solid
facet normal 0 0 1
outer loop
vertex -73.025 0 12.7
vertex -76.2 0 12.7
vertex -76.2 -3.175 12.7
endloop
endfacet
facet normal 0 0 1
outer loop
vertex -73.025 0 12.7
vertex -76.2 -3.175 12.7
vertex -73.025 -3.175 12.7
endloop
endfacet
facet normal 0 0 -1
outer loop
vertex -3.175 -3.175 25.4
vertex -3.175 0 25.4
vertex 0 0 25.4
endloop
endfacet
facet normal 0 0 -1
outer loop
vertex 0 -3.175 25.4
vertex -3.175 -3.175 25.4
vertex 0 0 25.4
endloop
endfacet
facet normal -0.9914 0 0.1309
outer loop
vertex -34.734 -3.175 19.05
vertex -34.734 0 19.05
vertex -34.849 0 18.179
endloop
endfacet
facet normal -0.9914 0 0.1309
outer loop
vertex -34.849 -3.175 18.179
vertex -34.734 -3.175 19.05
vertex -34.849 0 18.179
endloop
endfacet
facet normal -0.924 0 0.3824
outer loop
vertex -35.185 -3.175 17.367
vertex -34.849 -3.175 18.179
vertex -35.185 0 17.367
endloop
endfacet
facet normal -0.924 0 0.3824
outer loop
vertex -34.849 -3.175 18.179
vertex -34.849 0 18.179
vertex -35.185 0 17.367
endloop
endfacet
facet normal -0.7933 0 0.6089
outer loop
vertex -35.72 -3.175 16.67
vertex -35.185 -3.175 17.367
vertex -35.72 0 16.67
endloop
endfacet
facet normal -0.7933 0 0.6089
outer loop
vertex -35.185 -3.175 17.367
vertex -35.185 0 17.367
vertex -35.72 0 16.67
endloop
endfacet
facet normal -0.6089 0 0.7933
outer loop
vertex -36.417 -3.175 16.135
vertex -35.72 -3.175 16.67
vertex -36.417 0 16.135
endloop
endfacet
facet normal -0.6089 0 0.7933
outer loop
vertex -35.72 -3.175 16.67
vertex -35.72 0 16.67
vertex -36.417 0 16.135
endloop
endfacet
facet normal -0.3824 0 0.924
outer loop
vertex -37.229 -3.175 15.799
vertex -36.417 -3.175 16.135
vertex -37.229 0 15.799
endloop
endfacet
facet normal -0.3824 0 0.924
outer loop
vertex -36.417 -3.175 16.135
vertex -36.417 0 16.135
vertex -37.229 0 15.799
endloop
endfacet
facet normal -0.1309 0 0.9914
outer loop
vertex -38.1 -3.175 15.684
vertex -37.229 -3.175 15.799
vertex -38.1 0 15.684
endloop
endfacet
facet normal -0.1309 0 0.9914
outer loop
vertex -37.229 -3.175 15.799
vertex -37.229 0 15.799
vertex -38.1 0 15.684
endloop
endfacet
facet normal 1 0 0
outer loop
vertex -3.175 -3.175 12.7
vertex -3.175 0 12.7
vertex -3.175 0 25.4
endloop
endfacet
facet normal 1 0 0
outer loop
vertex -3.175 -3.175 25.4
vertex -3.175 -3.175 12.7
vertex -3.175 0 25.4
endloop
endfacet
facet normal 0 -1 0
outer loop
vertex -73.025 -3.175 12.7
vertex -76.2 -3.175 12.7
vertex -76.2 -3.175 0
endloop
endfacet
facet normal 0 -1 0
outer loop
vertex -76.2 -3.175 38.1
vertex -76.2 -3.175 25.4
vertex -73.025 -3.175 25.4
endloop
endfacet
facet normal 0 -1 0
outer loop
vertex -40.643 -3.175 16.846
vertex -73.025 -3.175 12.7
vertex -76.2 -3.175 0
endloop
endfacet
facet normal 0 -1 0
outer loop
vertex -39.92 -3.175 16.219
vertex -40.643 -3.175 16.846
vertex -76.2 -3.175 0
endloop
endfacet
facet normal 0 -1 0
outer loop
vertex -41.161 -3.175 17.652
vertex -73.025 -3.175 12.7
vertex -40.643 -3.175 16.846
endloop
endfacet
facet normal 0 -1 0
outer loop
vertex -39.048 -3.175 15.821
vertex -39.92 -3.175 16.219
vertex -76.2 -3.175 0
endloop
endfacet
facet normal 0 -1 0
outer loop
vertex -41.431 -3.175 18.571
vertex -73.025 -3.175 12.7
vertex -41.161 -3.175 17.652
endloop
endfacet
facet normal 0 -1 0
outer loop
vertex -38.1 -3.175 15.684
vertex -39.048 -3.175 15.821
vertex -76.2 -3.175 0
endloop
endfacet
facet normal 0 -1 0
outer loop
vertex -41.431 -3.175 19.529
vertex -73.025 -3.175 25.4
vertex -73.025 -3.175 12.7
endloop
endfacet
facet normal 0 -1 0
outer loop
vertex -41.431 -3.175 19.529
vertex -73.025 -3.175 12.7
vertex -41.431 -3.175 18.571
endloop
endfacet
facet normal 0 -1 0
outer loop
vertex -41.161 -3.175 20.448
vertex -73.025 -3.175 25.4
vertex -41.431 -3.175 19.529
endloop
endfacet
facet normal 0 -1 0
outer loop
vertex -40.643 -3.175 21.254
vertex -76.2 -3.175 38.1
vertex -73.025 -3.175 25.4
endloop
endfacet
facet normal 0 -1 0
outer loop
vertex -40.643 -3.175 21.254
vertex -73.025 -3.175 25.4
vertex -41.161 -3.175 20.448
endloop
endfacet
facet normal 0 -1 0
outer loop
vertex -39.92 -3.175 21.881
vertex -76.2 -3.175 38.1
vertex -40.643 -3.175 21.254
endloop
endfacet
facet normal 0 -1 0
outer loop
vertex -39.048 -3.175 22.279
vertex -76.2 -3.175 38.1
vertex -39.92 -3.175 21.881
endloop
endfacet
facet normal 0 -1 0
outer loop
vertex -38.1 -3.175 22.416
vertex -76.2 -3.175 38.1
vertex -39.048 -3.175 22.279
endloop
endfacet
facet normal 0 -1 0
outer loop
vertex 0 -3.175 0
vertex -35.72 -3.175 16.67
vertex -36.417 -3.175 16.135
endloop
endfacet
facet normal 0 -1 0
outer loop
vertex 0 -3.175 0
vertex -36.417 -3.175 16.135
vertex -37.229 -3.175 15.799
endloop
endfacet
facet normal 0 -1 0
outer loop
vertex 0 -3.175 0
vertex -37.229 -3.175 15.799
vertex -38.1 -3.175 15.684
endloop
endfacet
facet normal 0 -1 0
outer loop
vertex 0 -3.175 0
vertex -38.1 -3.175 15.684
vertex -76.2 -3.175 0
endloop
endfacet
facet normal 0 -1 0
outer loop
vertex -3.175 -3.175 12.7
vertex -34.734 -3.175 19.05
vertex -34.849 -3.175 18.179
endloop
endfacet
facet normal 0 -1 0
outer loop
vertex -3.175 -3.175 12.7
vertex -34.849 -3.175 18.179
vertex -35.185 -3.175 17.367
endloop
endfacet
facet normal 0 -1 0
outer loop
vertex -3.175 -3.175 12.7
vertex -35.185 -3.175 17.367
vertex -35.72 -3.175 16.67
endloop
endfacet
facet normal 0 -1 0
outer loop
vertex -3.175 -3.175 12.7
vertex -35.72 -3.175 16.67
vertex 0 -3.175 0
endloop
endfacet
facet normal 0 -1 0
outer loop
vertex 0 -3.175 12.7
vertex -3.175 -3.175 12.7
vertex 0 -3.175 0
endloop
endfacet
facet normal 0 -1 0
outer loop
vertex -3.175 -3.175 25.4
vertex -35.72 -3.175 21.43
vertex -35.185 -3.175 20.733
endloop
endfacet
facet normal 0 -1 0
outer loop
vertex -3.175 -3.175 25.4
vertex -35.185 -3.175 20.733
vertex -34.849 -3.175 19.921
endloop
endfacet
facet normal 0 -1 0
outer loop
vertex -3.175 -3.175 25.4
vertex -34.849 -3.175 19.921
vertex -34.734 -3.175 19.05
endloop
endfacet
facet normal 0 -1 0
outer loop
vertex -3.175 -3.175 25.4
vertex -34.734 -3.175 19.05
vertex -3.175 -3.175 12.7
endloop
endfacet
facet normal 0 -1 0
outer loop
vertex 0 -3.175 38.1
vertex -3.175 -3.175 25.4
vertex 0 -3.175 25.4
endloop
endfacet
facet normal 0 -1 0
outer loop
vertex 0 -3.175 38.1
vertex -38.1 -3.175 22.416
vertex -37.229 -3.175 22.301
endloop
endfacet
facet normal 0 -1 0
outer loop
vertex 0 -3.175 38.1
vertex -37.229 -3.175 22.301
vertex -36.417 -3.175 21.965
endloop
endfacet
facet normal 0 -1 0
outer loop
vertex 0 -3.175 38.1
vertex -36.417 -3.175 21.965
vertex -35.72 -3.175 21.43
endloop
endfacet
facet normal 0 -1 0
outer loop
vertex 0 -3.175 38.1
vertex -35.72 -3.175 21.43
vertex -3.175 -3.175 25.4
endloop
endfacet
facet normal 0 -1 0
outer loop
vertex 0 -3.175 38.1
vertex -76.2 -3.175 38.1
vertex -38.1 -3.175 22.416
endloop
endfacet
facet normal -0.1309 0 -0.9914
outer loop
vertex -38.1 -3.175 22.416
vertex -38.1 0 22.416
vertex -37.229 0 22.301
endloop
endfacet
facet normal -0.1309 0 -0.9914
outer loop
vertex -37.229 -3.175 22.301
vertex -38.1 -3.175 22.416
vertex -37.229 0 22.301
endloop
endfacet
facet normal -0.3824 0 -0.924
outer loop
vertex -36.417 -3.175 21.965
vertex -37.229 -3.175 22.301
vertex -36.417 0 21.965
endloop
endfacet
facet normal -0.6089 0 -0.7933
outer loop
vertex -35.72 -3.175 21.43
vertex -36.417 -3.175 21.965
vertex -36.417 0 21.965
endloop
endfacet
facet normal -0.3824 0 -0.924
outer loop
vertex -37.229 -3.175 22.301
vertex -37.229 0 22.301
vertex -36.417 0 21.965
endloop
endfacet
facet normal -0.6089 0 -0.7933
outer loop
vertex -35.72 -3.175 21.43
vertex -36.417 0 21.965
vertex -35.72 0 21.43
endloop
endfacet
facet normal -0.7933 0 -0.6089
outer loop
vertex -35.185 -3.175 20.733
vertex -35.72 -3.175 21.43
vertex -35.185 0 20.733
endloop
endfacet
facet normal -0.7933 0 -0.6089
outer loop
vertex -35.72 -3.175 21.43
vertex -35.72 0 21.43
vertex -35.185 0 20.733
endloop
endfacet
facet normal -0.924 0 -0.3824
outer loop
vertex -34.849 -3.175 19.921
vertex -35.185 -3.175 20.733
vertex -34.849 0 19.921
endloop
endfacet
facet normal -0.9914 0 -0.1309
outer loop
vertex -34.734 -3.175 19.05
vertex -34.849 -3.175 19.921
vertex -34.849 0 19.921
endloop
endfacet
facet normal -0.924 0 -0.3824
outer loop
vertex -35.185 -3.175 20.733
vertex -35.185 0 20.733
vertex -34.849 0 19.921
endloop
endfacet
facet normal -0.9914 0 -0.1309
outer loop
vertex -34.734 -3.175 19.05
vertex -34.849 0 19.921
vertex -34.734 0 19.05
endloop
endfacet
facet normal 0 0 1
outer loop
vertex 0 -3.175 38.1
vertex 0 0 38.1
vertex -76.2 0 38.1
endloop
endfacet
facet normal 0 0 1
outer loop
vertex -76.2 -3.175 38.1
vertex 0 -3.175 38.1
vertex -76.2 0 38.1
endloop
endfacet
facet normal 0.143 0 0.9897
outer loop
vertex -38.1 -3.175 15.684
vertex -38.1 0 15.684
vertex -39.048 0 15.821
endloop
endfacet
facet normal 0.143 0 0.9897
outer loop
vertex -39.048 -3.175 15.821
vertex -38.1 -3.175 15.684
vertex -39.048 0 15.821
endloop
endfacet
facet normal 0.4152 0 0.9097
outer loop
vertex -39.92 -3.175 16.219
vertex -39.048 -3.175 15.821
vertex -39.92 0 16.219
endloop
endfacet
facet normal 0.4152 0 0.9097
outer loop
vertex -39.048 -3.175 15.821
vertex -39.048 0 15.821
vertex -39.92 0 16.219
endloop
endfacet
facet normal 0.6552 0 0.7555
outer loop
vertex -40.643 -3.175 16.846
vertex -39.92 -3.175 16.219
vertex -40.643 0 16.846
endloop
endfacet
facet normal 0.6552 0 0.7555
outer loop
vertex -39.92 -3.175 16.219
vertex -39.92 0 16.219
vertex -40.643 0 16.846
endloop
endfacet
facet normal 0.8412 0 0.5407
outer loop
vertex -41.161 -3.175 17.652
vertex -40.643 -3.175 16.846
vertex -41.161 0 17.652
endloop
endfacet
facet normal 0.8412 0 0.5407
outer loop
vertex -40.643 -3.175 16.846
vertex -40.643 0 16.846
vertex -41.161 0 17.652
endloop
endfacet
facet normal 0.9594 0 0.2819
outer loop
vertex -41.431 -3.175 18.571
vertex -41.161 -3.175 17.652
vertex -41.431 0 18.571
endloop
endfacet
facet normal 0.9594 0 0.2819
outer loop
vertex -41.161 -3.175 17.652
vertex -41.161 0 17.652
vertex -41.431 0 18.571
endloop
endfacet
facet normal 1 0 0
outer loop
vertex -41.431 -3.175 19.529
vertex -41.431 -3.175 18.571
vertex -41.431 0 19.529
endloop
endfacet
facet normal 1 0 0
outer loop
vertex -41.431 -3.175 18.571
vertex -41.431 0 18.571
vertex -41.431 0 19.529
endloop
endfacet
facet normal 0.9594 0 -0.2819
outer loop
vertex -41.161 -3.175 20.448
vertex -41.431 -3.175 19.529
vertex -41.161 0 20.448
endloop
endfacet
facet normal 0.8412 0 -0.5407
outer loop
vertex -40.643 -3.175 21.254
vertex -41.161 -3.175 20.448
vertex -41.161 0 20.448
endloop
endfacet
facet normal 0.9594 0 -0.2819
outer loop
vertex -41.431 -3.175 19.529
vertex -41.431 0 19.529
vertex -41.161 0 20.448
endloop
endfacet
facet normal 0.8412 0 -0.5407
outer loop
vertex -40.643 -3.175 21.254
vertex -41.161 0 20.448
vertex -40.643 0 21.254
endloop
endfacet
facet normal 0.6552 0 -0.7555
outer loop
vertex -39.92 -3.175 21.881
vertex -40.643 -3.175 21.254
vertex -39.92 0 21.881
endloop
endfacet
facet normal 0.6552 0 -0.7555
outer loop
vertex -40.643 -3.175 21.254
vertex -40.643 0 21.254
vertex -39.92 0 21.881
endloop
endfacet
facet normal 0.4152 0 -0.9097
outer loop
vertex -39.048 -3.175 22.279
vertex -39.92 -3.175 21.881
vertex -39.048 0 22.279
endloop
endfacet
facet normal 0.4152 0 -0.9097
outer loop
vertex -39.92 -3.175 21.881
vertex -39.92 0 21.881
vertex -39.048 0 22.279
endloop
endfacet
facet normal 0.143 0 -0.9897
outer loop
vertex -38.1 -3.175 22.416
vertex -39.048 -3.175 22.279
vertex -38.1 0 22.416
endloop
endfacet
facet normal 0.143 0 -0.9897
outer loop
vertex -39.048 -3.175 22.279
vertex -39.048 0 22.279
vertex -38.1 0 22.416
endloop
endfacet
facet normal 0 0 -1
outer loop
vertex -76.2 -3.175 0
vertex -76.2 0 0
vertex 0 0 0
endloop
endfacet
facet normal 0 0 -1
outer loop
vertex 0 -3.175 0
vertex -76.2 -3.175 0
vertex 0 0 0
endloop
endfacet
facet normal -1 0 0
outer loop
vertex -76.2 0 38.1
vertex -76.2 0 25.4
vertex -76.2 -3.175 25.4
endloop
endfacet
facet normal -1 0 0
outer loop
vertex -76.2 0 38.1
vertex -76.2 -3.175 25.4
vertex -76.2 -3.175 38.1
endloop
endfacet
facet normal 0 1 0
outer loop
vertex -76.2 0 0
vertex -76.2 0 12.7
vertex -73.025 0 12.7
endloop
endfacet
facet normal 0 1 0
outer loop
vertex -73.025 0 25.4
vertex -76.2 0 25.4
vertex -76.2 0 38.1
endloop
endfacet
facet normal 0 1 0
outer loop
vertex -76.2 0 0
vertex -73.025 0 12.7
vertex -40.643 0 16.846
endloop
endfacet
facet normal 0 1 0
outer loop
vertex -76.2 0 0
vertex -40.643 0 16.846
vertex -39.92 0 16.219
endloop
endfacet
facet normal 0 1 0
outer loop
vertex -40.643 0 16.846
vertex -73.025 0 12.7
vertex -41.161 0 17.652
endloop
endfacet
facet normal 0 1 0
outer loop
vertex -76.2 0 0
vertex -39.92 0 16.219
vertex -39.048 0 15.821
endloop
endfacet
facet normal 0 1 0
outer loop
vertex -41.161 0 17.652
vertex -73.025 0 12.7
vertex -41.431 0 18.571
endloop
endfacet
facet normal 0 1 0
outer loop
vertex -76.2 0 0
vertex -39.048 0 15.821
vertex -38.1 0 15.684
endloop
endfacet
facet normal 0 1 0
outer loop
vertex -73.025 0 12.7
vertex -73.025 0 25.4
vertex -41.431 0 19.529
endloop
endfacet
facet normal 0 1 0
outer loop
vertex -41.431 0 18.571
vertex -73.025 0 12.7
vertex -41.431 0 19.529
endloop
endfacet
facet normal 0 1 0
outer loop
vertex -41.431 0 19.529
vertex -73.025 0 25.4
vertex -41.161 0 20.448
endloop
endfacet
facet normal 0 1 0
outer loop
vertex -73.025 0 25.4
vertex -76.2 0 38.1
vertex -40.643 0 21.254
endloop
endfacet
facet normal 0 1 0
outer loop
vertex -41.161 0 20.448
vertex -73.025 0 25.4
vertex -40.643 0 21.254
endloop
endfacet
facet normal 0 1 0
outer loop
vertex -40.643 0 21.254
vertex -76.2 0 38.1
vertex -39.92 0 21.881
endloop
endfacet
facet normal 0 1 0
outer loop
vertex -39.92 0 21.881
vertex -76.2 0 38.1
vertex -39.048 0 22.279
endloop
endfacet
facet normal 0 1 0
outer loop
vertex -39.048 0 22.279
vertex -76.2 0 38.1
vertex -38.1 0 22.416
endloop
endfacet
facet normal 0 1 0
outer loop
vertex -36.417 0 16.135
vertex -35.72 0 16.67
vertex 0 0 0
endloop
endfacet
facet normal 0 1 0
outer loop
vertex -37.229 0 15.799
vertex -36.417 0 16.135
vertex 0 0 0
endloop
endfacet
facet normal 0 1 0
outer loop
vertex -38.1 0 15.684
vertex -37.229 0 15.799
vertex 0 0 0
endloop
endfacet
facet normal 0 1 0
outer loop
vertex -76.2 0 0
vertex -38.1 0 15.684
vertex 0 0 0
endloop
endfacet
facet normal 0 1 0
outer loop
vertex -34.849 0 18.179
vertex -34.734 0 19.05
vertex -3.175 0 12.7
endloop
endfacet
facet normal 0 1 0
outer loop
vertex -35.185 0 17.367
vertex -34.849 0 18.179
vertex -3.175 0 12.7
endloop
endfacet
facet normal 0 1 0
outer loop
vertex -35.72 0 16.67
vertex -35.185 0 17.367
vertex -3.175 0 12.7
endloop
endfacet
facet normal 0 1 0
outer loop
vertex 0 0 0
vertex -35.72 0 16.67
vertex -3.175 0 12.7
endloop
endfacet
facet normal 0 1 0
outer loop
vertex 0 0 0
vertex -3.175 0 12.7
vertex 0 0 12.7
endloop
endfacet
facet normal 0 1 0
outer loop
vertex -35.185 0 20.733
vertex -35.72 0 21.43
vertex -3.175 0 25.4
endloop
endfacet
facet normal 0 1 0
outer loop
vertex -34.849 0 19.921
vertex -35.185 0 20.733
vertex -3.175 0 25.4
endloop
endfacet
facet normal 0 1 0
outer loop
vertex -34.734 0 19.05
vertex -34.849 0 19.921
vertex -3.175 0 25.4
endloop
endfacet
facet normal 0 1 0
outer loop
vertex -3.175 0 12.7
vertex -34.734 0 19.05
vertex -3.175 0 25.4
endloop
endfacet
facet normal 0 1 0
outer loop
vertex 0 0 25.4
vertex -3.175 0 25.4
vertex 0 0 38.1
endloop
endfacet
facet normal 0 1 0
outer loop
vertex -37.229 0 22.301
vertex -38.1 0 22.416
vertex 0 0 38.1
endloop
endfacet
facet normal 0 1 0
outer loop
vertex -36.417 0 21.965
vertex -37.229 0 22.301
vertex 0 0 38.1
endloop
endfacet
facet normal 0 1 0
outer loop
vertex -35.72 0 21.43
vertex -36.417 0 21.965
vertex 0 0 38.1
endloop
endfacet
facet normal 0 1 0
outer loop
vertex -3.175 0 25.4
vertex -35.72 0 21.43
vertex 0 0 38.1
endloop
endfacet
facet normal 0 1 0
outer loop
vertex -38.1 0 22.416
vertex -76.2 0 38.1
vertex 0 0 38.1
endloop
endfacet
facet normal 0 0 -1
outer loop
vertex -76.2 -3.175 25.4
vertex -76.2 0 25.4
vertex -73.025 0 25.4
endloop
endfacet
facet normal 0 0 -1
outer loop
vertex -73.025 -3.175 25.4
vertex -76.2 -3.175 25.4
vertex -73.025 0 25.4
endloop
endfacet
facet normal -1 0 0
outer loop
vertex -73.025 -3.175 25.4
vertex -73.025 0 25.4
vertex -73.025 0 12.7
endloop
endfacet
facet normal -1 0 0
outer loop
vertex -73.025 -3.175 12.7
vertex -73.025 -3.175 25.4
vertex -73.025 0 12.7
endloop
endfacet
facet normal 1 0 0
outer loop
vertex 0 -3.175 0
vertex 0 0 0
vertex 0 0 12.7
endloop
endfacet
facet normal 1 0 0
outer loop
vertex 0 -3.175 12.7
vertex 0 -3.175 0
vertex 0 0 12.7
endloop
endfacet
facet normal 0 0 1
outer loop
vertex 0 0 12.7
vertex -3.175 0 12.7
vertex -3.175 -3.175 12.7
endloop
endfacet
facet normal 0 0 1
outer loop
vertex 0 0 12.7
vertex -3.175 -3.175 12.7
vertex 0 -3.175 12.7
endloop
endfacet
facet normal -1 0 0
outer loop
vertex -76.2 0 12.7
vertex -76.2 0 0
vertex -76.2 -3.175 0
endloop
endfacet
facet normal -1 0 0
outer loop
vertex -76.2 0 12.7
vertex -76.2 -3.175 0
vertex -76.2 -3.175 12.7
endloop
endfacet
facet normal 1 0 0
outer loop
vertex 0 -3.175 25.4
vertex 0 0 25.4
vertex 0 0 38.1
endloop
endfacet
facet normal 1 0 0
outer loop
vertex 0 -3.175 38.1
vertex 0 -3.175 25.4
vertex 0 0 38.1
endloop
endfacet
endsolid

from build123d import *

# Parameters (mm, degrees)
F0_W     = 3.175
F0_H     = 12.7
F1_DEPTH = 3.175


with BuildPart() as f1:
    # F0 (on Front) → F1 (new body)
    with BuildSketch(Plane.XZ):
        with Locations((-74.6125, 6.35)):
            Rectangle(F0_W, F0_H)
        with BuildLine():
            Line((-73.025, 0), (-38.1, 0))
            Line((-38.1, 0), (-38.1, 15.6845))
            ThreePointArc((-38.1, 15.6845), (-41.4655, 19.05), (-38.1, 22.4155))
            Line((-38.1, 22.4155), (-38.1, 38.1))
            Line((-38.1, 38.1), (-73.025, 38.1))
            Line((-73.025, 38.1), (-73.025, 25.4))
            Line((-73.025, 25.4), (-73.025, 12.7))
            Line((-73.025, 12.7), (-73.025, 0))
        make_face()
        with Locations((-74.6125, 31.75)):
            Rectangle(F0_W, F0_H)
        with BuildLine():
            Line((-38.1, 0), (-3.175, 0))
            Line((-3.175, 0), (-3.175, 12.7))
            Line((-3.175, 12.7), (-3.175, 25.4))
            Line((-3.175, 25.4), (-3.175, 38.1))
            Line((-3.175, 38.1), (-38.1, 38.1))
            Line((-38.1, 38.1), (-38.1, 22.4155))
            ThreePointArc((-38.1, 22.4155), (-35.720232, 21.429768), (-34.7345, 19.05))
            ThreePointArc((-34.7345, 19.05), (-35.720232, 16.670232), (-38.1, 15.6845))
            Line((-38.1, 15.6845), (-38.1, 0))
        make_face()
        with Locations((-1.5875, 6.35)):
            Rectangle(F0_W, F0_H)
        with Locations((-1.5875, 31.75)):
            Rectangle(F0_W, F0_H)
    extrude(amount=F1_DEPTH)


solid = f1.part
